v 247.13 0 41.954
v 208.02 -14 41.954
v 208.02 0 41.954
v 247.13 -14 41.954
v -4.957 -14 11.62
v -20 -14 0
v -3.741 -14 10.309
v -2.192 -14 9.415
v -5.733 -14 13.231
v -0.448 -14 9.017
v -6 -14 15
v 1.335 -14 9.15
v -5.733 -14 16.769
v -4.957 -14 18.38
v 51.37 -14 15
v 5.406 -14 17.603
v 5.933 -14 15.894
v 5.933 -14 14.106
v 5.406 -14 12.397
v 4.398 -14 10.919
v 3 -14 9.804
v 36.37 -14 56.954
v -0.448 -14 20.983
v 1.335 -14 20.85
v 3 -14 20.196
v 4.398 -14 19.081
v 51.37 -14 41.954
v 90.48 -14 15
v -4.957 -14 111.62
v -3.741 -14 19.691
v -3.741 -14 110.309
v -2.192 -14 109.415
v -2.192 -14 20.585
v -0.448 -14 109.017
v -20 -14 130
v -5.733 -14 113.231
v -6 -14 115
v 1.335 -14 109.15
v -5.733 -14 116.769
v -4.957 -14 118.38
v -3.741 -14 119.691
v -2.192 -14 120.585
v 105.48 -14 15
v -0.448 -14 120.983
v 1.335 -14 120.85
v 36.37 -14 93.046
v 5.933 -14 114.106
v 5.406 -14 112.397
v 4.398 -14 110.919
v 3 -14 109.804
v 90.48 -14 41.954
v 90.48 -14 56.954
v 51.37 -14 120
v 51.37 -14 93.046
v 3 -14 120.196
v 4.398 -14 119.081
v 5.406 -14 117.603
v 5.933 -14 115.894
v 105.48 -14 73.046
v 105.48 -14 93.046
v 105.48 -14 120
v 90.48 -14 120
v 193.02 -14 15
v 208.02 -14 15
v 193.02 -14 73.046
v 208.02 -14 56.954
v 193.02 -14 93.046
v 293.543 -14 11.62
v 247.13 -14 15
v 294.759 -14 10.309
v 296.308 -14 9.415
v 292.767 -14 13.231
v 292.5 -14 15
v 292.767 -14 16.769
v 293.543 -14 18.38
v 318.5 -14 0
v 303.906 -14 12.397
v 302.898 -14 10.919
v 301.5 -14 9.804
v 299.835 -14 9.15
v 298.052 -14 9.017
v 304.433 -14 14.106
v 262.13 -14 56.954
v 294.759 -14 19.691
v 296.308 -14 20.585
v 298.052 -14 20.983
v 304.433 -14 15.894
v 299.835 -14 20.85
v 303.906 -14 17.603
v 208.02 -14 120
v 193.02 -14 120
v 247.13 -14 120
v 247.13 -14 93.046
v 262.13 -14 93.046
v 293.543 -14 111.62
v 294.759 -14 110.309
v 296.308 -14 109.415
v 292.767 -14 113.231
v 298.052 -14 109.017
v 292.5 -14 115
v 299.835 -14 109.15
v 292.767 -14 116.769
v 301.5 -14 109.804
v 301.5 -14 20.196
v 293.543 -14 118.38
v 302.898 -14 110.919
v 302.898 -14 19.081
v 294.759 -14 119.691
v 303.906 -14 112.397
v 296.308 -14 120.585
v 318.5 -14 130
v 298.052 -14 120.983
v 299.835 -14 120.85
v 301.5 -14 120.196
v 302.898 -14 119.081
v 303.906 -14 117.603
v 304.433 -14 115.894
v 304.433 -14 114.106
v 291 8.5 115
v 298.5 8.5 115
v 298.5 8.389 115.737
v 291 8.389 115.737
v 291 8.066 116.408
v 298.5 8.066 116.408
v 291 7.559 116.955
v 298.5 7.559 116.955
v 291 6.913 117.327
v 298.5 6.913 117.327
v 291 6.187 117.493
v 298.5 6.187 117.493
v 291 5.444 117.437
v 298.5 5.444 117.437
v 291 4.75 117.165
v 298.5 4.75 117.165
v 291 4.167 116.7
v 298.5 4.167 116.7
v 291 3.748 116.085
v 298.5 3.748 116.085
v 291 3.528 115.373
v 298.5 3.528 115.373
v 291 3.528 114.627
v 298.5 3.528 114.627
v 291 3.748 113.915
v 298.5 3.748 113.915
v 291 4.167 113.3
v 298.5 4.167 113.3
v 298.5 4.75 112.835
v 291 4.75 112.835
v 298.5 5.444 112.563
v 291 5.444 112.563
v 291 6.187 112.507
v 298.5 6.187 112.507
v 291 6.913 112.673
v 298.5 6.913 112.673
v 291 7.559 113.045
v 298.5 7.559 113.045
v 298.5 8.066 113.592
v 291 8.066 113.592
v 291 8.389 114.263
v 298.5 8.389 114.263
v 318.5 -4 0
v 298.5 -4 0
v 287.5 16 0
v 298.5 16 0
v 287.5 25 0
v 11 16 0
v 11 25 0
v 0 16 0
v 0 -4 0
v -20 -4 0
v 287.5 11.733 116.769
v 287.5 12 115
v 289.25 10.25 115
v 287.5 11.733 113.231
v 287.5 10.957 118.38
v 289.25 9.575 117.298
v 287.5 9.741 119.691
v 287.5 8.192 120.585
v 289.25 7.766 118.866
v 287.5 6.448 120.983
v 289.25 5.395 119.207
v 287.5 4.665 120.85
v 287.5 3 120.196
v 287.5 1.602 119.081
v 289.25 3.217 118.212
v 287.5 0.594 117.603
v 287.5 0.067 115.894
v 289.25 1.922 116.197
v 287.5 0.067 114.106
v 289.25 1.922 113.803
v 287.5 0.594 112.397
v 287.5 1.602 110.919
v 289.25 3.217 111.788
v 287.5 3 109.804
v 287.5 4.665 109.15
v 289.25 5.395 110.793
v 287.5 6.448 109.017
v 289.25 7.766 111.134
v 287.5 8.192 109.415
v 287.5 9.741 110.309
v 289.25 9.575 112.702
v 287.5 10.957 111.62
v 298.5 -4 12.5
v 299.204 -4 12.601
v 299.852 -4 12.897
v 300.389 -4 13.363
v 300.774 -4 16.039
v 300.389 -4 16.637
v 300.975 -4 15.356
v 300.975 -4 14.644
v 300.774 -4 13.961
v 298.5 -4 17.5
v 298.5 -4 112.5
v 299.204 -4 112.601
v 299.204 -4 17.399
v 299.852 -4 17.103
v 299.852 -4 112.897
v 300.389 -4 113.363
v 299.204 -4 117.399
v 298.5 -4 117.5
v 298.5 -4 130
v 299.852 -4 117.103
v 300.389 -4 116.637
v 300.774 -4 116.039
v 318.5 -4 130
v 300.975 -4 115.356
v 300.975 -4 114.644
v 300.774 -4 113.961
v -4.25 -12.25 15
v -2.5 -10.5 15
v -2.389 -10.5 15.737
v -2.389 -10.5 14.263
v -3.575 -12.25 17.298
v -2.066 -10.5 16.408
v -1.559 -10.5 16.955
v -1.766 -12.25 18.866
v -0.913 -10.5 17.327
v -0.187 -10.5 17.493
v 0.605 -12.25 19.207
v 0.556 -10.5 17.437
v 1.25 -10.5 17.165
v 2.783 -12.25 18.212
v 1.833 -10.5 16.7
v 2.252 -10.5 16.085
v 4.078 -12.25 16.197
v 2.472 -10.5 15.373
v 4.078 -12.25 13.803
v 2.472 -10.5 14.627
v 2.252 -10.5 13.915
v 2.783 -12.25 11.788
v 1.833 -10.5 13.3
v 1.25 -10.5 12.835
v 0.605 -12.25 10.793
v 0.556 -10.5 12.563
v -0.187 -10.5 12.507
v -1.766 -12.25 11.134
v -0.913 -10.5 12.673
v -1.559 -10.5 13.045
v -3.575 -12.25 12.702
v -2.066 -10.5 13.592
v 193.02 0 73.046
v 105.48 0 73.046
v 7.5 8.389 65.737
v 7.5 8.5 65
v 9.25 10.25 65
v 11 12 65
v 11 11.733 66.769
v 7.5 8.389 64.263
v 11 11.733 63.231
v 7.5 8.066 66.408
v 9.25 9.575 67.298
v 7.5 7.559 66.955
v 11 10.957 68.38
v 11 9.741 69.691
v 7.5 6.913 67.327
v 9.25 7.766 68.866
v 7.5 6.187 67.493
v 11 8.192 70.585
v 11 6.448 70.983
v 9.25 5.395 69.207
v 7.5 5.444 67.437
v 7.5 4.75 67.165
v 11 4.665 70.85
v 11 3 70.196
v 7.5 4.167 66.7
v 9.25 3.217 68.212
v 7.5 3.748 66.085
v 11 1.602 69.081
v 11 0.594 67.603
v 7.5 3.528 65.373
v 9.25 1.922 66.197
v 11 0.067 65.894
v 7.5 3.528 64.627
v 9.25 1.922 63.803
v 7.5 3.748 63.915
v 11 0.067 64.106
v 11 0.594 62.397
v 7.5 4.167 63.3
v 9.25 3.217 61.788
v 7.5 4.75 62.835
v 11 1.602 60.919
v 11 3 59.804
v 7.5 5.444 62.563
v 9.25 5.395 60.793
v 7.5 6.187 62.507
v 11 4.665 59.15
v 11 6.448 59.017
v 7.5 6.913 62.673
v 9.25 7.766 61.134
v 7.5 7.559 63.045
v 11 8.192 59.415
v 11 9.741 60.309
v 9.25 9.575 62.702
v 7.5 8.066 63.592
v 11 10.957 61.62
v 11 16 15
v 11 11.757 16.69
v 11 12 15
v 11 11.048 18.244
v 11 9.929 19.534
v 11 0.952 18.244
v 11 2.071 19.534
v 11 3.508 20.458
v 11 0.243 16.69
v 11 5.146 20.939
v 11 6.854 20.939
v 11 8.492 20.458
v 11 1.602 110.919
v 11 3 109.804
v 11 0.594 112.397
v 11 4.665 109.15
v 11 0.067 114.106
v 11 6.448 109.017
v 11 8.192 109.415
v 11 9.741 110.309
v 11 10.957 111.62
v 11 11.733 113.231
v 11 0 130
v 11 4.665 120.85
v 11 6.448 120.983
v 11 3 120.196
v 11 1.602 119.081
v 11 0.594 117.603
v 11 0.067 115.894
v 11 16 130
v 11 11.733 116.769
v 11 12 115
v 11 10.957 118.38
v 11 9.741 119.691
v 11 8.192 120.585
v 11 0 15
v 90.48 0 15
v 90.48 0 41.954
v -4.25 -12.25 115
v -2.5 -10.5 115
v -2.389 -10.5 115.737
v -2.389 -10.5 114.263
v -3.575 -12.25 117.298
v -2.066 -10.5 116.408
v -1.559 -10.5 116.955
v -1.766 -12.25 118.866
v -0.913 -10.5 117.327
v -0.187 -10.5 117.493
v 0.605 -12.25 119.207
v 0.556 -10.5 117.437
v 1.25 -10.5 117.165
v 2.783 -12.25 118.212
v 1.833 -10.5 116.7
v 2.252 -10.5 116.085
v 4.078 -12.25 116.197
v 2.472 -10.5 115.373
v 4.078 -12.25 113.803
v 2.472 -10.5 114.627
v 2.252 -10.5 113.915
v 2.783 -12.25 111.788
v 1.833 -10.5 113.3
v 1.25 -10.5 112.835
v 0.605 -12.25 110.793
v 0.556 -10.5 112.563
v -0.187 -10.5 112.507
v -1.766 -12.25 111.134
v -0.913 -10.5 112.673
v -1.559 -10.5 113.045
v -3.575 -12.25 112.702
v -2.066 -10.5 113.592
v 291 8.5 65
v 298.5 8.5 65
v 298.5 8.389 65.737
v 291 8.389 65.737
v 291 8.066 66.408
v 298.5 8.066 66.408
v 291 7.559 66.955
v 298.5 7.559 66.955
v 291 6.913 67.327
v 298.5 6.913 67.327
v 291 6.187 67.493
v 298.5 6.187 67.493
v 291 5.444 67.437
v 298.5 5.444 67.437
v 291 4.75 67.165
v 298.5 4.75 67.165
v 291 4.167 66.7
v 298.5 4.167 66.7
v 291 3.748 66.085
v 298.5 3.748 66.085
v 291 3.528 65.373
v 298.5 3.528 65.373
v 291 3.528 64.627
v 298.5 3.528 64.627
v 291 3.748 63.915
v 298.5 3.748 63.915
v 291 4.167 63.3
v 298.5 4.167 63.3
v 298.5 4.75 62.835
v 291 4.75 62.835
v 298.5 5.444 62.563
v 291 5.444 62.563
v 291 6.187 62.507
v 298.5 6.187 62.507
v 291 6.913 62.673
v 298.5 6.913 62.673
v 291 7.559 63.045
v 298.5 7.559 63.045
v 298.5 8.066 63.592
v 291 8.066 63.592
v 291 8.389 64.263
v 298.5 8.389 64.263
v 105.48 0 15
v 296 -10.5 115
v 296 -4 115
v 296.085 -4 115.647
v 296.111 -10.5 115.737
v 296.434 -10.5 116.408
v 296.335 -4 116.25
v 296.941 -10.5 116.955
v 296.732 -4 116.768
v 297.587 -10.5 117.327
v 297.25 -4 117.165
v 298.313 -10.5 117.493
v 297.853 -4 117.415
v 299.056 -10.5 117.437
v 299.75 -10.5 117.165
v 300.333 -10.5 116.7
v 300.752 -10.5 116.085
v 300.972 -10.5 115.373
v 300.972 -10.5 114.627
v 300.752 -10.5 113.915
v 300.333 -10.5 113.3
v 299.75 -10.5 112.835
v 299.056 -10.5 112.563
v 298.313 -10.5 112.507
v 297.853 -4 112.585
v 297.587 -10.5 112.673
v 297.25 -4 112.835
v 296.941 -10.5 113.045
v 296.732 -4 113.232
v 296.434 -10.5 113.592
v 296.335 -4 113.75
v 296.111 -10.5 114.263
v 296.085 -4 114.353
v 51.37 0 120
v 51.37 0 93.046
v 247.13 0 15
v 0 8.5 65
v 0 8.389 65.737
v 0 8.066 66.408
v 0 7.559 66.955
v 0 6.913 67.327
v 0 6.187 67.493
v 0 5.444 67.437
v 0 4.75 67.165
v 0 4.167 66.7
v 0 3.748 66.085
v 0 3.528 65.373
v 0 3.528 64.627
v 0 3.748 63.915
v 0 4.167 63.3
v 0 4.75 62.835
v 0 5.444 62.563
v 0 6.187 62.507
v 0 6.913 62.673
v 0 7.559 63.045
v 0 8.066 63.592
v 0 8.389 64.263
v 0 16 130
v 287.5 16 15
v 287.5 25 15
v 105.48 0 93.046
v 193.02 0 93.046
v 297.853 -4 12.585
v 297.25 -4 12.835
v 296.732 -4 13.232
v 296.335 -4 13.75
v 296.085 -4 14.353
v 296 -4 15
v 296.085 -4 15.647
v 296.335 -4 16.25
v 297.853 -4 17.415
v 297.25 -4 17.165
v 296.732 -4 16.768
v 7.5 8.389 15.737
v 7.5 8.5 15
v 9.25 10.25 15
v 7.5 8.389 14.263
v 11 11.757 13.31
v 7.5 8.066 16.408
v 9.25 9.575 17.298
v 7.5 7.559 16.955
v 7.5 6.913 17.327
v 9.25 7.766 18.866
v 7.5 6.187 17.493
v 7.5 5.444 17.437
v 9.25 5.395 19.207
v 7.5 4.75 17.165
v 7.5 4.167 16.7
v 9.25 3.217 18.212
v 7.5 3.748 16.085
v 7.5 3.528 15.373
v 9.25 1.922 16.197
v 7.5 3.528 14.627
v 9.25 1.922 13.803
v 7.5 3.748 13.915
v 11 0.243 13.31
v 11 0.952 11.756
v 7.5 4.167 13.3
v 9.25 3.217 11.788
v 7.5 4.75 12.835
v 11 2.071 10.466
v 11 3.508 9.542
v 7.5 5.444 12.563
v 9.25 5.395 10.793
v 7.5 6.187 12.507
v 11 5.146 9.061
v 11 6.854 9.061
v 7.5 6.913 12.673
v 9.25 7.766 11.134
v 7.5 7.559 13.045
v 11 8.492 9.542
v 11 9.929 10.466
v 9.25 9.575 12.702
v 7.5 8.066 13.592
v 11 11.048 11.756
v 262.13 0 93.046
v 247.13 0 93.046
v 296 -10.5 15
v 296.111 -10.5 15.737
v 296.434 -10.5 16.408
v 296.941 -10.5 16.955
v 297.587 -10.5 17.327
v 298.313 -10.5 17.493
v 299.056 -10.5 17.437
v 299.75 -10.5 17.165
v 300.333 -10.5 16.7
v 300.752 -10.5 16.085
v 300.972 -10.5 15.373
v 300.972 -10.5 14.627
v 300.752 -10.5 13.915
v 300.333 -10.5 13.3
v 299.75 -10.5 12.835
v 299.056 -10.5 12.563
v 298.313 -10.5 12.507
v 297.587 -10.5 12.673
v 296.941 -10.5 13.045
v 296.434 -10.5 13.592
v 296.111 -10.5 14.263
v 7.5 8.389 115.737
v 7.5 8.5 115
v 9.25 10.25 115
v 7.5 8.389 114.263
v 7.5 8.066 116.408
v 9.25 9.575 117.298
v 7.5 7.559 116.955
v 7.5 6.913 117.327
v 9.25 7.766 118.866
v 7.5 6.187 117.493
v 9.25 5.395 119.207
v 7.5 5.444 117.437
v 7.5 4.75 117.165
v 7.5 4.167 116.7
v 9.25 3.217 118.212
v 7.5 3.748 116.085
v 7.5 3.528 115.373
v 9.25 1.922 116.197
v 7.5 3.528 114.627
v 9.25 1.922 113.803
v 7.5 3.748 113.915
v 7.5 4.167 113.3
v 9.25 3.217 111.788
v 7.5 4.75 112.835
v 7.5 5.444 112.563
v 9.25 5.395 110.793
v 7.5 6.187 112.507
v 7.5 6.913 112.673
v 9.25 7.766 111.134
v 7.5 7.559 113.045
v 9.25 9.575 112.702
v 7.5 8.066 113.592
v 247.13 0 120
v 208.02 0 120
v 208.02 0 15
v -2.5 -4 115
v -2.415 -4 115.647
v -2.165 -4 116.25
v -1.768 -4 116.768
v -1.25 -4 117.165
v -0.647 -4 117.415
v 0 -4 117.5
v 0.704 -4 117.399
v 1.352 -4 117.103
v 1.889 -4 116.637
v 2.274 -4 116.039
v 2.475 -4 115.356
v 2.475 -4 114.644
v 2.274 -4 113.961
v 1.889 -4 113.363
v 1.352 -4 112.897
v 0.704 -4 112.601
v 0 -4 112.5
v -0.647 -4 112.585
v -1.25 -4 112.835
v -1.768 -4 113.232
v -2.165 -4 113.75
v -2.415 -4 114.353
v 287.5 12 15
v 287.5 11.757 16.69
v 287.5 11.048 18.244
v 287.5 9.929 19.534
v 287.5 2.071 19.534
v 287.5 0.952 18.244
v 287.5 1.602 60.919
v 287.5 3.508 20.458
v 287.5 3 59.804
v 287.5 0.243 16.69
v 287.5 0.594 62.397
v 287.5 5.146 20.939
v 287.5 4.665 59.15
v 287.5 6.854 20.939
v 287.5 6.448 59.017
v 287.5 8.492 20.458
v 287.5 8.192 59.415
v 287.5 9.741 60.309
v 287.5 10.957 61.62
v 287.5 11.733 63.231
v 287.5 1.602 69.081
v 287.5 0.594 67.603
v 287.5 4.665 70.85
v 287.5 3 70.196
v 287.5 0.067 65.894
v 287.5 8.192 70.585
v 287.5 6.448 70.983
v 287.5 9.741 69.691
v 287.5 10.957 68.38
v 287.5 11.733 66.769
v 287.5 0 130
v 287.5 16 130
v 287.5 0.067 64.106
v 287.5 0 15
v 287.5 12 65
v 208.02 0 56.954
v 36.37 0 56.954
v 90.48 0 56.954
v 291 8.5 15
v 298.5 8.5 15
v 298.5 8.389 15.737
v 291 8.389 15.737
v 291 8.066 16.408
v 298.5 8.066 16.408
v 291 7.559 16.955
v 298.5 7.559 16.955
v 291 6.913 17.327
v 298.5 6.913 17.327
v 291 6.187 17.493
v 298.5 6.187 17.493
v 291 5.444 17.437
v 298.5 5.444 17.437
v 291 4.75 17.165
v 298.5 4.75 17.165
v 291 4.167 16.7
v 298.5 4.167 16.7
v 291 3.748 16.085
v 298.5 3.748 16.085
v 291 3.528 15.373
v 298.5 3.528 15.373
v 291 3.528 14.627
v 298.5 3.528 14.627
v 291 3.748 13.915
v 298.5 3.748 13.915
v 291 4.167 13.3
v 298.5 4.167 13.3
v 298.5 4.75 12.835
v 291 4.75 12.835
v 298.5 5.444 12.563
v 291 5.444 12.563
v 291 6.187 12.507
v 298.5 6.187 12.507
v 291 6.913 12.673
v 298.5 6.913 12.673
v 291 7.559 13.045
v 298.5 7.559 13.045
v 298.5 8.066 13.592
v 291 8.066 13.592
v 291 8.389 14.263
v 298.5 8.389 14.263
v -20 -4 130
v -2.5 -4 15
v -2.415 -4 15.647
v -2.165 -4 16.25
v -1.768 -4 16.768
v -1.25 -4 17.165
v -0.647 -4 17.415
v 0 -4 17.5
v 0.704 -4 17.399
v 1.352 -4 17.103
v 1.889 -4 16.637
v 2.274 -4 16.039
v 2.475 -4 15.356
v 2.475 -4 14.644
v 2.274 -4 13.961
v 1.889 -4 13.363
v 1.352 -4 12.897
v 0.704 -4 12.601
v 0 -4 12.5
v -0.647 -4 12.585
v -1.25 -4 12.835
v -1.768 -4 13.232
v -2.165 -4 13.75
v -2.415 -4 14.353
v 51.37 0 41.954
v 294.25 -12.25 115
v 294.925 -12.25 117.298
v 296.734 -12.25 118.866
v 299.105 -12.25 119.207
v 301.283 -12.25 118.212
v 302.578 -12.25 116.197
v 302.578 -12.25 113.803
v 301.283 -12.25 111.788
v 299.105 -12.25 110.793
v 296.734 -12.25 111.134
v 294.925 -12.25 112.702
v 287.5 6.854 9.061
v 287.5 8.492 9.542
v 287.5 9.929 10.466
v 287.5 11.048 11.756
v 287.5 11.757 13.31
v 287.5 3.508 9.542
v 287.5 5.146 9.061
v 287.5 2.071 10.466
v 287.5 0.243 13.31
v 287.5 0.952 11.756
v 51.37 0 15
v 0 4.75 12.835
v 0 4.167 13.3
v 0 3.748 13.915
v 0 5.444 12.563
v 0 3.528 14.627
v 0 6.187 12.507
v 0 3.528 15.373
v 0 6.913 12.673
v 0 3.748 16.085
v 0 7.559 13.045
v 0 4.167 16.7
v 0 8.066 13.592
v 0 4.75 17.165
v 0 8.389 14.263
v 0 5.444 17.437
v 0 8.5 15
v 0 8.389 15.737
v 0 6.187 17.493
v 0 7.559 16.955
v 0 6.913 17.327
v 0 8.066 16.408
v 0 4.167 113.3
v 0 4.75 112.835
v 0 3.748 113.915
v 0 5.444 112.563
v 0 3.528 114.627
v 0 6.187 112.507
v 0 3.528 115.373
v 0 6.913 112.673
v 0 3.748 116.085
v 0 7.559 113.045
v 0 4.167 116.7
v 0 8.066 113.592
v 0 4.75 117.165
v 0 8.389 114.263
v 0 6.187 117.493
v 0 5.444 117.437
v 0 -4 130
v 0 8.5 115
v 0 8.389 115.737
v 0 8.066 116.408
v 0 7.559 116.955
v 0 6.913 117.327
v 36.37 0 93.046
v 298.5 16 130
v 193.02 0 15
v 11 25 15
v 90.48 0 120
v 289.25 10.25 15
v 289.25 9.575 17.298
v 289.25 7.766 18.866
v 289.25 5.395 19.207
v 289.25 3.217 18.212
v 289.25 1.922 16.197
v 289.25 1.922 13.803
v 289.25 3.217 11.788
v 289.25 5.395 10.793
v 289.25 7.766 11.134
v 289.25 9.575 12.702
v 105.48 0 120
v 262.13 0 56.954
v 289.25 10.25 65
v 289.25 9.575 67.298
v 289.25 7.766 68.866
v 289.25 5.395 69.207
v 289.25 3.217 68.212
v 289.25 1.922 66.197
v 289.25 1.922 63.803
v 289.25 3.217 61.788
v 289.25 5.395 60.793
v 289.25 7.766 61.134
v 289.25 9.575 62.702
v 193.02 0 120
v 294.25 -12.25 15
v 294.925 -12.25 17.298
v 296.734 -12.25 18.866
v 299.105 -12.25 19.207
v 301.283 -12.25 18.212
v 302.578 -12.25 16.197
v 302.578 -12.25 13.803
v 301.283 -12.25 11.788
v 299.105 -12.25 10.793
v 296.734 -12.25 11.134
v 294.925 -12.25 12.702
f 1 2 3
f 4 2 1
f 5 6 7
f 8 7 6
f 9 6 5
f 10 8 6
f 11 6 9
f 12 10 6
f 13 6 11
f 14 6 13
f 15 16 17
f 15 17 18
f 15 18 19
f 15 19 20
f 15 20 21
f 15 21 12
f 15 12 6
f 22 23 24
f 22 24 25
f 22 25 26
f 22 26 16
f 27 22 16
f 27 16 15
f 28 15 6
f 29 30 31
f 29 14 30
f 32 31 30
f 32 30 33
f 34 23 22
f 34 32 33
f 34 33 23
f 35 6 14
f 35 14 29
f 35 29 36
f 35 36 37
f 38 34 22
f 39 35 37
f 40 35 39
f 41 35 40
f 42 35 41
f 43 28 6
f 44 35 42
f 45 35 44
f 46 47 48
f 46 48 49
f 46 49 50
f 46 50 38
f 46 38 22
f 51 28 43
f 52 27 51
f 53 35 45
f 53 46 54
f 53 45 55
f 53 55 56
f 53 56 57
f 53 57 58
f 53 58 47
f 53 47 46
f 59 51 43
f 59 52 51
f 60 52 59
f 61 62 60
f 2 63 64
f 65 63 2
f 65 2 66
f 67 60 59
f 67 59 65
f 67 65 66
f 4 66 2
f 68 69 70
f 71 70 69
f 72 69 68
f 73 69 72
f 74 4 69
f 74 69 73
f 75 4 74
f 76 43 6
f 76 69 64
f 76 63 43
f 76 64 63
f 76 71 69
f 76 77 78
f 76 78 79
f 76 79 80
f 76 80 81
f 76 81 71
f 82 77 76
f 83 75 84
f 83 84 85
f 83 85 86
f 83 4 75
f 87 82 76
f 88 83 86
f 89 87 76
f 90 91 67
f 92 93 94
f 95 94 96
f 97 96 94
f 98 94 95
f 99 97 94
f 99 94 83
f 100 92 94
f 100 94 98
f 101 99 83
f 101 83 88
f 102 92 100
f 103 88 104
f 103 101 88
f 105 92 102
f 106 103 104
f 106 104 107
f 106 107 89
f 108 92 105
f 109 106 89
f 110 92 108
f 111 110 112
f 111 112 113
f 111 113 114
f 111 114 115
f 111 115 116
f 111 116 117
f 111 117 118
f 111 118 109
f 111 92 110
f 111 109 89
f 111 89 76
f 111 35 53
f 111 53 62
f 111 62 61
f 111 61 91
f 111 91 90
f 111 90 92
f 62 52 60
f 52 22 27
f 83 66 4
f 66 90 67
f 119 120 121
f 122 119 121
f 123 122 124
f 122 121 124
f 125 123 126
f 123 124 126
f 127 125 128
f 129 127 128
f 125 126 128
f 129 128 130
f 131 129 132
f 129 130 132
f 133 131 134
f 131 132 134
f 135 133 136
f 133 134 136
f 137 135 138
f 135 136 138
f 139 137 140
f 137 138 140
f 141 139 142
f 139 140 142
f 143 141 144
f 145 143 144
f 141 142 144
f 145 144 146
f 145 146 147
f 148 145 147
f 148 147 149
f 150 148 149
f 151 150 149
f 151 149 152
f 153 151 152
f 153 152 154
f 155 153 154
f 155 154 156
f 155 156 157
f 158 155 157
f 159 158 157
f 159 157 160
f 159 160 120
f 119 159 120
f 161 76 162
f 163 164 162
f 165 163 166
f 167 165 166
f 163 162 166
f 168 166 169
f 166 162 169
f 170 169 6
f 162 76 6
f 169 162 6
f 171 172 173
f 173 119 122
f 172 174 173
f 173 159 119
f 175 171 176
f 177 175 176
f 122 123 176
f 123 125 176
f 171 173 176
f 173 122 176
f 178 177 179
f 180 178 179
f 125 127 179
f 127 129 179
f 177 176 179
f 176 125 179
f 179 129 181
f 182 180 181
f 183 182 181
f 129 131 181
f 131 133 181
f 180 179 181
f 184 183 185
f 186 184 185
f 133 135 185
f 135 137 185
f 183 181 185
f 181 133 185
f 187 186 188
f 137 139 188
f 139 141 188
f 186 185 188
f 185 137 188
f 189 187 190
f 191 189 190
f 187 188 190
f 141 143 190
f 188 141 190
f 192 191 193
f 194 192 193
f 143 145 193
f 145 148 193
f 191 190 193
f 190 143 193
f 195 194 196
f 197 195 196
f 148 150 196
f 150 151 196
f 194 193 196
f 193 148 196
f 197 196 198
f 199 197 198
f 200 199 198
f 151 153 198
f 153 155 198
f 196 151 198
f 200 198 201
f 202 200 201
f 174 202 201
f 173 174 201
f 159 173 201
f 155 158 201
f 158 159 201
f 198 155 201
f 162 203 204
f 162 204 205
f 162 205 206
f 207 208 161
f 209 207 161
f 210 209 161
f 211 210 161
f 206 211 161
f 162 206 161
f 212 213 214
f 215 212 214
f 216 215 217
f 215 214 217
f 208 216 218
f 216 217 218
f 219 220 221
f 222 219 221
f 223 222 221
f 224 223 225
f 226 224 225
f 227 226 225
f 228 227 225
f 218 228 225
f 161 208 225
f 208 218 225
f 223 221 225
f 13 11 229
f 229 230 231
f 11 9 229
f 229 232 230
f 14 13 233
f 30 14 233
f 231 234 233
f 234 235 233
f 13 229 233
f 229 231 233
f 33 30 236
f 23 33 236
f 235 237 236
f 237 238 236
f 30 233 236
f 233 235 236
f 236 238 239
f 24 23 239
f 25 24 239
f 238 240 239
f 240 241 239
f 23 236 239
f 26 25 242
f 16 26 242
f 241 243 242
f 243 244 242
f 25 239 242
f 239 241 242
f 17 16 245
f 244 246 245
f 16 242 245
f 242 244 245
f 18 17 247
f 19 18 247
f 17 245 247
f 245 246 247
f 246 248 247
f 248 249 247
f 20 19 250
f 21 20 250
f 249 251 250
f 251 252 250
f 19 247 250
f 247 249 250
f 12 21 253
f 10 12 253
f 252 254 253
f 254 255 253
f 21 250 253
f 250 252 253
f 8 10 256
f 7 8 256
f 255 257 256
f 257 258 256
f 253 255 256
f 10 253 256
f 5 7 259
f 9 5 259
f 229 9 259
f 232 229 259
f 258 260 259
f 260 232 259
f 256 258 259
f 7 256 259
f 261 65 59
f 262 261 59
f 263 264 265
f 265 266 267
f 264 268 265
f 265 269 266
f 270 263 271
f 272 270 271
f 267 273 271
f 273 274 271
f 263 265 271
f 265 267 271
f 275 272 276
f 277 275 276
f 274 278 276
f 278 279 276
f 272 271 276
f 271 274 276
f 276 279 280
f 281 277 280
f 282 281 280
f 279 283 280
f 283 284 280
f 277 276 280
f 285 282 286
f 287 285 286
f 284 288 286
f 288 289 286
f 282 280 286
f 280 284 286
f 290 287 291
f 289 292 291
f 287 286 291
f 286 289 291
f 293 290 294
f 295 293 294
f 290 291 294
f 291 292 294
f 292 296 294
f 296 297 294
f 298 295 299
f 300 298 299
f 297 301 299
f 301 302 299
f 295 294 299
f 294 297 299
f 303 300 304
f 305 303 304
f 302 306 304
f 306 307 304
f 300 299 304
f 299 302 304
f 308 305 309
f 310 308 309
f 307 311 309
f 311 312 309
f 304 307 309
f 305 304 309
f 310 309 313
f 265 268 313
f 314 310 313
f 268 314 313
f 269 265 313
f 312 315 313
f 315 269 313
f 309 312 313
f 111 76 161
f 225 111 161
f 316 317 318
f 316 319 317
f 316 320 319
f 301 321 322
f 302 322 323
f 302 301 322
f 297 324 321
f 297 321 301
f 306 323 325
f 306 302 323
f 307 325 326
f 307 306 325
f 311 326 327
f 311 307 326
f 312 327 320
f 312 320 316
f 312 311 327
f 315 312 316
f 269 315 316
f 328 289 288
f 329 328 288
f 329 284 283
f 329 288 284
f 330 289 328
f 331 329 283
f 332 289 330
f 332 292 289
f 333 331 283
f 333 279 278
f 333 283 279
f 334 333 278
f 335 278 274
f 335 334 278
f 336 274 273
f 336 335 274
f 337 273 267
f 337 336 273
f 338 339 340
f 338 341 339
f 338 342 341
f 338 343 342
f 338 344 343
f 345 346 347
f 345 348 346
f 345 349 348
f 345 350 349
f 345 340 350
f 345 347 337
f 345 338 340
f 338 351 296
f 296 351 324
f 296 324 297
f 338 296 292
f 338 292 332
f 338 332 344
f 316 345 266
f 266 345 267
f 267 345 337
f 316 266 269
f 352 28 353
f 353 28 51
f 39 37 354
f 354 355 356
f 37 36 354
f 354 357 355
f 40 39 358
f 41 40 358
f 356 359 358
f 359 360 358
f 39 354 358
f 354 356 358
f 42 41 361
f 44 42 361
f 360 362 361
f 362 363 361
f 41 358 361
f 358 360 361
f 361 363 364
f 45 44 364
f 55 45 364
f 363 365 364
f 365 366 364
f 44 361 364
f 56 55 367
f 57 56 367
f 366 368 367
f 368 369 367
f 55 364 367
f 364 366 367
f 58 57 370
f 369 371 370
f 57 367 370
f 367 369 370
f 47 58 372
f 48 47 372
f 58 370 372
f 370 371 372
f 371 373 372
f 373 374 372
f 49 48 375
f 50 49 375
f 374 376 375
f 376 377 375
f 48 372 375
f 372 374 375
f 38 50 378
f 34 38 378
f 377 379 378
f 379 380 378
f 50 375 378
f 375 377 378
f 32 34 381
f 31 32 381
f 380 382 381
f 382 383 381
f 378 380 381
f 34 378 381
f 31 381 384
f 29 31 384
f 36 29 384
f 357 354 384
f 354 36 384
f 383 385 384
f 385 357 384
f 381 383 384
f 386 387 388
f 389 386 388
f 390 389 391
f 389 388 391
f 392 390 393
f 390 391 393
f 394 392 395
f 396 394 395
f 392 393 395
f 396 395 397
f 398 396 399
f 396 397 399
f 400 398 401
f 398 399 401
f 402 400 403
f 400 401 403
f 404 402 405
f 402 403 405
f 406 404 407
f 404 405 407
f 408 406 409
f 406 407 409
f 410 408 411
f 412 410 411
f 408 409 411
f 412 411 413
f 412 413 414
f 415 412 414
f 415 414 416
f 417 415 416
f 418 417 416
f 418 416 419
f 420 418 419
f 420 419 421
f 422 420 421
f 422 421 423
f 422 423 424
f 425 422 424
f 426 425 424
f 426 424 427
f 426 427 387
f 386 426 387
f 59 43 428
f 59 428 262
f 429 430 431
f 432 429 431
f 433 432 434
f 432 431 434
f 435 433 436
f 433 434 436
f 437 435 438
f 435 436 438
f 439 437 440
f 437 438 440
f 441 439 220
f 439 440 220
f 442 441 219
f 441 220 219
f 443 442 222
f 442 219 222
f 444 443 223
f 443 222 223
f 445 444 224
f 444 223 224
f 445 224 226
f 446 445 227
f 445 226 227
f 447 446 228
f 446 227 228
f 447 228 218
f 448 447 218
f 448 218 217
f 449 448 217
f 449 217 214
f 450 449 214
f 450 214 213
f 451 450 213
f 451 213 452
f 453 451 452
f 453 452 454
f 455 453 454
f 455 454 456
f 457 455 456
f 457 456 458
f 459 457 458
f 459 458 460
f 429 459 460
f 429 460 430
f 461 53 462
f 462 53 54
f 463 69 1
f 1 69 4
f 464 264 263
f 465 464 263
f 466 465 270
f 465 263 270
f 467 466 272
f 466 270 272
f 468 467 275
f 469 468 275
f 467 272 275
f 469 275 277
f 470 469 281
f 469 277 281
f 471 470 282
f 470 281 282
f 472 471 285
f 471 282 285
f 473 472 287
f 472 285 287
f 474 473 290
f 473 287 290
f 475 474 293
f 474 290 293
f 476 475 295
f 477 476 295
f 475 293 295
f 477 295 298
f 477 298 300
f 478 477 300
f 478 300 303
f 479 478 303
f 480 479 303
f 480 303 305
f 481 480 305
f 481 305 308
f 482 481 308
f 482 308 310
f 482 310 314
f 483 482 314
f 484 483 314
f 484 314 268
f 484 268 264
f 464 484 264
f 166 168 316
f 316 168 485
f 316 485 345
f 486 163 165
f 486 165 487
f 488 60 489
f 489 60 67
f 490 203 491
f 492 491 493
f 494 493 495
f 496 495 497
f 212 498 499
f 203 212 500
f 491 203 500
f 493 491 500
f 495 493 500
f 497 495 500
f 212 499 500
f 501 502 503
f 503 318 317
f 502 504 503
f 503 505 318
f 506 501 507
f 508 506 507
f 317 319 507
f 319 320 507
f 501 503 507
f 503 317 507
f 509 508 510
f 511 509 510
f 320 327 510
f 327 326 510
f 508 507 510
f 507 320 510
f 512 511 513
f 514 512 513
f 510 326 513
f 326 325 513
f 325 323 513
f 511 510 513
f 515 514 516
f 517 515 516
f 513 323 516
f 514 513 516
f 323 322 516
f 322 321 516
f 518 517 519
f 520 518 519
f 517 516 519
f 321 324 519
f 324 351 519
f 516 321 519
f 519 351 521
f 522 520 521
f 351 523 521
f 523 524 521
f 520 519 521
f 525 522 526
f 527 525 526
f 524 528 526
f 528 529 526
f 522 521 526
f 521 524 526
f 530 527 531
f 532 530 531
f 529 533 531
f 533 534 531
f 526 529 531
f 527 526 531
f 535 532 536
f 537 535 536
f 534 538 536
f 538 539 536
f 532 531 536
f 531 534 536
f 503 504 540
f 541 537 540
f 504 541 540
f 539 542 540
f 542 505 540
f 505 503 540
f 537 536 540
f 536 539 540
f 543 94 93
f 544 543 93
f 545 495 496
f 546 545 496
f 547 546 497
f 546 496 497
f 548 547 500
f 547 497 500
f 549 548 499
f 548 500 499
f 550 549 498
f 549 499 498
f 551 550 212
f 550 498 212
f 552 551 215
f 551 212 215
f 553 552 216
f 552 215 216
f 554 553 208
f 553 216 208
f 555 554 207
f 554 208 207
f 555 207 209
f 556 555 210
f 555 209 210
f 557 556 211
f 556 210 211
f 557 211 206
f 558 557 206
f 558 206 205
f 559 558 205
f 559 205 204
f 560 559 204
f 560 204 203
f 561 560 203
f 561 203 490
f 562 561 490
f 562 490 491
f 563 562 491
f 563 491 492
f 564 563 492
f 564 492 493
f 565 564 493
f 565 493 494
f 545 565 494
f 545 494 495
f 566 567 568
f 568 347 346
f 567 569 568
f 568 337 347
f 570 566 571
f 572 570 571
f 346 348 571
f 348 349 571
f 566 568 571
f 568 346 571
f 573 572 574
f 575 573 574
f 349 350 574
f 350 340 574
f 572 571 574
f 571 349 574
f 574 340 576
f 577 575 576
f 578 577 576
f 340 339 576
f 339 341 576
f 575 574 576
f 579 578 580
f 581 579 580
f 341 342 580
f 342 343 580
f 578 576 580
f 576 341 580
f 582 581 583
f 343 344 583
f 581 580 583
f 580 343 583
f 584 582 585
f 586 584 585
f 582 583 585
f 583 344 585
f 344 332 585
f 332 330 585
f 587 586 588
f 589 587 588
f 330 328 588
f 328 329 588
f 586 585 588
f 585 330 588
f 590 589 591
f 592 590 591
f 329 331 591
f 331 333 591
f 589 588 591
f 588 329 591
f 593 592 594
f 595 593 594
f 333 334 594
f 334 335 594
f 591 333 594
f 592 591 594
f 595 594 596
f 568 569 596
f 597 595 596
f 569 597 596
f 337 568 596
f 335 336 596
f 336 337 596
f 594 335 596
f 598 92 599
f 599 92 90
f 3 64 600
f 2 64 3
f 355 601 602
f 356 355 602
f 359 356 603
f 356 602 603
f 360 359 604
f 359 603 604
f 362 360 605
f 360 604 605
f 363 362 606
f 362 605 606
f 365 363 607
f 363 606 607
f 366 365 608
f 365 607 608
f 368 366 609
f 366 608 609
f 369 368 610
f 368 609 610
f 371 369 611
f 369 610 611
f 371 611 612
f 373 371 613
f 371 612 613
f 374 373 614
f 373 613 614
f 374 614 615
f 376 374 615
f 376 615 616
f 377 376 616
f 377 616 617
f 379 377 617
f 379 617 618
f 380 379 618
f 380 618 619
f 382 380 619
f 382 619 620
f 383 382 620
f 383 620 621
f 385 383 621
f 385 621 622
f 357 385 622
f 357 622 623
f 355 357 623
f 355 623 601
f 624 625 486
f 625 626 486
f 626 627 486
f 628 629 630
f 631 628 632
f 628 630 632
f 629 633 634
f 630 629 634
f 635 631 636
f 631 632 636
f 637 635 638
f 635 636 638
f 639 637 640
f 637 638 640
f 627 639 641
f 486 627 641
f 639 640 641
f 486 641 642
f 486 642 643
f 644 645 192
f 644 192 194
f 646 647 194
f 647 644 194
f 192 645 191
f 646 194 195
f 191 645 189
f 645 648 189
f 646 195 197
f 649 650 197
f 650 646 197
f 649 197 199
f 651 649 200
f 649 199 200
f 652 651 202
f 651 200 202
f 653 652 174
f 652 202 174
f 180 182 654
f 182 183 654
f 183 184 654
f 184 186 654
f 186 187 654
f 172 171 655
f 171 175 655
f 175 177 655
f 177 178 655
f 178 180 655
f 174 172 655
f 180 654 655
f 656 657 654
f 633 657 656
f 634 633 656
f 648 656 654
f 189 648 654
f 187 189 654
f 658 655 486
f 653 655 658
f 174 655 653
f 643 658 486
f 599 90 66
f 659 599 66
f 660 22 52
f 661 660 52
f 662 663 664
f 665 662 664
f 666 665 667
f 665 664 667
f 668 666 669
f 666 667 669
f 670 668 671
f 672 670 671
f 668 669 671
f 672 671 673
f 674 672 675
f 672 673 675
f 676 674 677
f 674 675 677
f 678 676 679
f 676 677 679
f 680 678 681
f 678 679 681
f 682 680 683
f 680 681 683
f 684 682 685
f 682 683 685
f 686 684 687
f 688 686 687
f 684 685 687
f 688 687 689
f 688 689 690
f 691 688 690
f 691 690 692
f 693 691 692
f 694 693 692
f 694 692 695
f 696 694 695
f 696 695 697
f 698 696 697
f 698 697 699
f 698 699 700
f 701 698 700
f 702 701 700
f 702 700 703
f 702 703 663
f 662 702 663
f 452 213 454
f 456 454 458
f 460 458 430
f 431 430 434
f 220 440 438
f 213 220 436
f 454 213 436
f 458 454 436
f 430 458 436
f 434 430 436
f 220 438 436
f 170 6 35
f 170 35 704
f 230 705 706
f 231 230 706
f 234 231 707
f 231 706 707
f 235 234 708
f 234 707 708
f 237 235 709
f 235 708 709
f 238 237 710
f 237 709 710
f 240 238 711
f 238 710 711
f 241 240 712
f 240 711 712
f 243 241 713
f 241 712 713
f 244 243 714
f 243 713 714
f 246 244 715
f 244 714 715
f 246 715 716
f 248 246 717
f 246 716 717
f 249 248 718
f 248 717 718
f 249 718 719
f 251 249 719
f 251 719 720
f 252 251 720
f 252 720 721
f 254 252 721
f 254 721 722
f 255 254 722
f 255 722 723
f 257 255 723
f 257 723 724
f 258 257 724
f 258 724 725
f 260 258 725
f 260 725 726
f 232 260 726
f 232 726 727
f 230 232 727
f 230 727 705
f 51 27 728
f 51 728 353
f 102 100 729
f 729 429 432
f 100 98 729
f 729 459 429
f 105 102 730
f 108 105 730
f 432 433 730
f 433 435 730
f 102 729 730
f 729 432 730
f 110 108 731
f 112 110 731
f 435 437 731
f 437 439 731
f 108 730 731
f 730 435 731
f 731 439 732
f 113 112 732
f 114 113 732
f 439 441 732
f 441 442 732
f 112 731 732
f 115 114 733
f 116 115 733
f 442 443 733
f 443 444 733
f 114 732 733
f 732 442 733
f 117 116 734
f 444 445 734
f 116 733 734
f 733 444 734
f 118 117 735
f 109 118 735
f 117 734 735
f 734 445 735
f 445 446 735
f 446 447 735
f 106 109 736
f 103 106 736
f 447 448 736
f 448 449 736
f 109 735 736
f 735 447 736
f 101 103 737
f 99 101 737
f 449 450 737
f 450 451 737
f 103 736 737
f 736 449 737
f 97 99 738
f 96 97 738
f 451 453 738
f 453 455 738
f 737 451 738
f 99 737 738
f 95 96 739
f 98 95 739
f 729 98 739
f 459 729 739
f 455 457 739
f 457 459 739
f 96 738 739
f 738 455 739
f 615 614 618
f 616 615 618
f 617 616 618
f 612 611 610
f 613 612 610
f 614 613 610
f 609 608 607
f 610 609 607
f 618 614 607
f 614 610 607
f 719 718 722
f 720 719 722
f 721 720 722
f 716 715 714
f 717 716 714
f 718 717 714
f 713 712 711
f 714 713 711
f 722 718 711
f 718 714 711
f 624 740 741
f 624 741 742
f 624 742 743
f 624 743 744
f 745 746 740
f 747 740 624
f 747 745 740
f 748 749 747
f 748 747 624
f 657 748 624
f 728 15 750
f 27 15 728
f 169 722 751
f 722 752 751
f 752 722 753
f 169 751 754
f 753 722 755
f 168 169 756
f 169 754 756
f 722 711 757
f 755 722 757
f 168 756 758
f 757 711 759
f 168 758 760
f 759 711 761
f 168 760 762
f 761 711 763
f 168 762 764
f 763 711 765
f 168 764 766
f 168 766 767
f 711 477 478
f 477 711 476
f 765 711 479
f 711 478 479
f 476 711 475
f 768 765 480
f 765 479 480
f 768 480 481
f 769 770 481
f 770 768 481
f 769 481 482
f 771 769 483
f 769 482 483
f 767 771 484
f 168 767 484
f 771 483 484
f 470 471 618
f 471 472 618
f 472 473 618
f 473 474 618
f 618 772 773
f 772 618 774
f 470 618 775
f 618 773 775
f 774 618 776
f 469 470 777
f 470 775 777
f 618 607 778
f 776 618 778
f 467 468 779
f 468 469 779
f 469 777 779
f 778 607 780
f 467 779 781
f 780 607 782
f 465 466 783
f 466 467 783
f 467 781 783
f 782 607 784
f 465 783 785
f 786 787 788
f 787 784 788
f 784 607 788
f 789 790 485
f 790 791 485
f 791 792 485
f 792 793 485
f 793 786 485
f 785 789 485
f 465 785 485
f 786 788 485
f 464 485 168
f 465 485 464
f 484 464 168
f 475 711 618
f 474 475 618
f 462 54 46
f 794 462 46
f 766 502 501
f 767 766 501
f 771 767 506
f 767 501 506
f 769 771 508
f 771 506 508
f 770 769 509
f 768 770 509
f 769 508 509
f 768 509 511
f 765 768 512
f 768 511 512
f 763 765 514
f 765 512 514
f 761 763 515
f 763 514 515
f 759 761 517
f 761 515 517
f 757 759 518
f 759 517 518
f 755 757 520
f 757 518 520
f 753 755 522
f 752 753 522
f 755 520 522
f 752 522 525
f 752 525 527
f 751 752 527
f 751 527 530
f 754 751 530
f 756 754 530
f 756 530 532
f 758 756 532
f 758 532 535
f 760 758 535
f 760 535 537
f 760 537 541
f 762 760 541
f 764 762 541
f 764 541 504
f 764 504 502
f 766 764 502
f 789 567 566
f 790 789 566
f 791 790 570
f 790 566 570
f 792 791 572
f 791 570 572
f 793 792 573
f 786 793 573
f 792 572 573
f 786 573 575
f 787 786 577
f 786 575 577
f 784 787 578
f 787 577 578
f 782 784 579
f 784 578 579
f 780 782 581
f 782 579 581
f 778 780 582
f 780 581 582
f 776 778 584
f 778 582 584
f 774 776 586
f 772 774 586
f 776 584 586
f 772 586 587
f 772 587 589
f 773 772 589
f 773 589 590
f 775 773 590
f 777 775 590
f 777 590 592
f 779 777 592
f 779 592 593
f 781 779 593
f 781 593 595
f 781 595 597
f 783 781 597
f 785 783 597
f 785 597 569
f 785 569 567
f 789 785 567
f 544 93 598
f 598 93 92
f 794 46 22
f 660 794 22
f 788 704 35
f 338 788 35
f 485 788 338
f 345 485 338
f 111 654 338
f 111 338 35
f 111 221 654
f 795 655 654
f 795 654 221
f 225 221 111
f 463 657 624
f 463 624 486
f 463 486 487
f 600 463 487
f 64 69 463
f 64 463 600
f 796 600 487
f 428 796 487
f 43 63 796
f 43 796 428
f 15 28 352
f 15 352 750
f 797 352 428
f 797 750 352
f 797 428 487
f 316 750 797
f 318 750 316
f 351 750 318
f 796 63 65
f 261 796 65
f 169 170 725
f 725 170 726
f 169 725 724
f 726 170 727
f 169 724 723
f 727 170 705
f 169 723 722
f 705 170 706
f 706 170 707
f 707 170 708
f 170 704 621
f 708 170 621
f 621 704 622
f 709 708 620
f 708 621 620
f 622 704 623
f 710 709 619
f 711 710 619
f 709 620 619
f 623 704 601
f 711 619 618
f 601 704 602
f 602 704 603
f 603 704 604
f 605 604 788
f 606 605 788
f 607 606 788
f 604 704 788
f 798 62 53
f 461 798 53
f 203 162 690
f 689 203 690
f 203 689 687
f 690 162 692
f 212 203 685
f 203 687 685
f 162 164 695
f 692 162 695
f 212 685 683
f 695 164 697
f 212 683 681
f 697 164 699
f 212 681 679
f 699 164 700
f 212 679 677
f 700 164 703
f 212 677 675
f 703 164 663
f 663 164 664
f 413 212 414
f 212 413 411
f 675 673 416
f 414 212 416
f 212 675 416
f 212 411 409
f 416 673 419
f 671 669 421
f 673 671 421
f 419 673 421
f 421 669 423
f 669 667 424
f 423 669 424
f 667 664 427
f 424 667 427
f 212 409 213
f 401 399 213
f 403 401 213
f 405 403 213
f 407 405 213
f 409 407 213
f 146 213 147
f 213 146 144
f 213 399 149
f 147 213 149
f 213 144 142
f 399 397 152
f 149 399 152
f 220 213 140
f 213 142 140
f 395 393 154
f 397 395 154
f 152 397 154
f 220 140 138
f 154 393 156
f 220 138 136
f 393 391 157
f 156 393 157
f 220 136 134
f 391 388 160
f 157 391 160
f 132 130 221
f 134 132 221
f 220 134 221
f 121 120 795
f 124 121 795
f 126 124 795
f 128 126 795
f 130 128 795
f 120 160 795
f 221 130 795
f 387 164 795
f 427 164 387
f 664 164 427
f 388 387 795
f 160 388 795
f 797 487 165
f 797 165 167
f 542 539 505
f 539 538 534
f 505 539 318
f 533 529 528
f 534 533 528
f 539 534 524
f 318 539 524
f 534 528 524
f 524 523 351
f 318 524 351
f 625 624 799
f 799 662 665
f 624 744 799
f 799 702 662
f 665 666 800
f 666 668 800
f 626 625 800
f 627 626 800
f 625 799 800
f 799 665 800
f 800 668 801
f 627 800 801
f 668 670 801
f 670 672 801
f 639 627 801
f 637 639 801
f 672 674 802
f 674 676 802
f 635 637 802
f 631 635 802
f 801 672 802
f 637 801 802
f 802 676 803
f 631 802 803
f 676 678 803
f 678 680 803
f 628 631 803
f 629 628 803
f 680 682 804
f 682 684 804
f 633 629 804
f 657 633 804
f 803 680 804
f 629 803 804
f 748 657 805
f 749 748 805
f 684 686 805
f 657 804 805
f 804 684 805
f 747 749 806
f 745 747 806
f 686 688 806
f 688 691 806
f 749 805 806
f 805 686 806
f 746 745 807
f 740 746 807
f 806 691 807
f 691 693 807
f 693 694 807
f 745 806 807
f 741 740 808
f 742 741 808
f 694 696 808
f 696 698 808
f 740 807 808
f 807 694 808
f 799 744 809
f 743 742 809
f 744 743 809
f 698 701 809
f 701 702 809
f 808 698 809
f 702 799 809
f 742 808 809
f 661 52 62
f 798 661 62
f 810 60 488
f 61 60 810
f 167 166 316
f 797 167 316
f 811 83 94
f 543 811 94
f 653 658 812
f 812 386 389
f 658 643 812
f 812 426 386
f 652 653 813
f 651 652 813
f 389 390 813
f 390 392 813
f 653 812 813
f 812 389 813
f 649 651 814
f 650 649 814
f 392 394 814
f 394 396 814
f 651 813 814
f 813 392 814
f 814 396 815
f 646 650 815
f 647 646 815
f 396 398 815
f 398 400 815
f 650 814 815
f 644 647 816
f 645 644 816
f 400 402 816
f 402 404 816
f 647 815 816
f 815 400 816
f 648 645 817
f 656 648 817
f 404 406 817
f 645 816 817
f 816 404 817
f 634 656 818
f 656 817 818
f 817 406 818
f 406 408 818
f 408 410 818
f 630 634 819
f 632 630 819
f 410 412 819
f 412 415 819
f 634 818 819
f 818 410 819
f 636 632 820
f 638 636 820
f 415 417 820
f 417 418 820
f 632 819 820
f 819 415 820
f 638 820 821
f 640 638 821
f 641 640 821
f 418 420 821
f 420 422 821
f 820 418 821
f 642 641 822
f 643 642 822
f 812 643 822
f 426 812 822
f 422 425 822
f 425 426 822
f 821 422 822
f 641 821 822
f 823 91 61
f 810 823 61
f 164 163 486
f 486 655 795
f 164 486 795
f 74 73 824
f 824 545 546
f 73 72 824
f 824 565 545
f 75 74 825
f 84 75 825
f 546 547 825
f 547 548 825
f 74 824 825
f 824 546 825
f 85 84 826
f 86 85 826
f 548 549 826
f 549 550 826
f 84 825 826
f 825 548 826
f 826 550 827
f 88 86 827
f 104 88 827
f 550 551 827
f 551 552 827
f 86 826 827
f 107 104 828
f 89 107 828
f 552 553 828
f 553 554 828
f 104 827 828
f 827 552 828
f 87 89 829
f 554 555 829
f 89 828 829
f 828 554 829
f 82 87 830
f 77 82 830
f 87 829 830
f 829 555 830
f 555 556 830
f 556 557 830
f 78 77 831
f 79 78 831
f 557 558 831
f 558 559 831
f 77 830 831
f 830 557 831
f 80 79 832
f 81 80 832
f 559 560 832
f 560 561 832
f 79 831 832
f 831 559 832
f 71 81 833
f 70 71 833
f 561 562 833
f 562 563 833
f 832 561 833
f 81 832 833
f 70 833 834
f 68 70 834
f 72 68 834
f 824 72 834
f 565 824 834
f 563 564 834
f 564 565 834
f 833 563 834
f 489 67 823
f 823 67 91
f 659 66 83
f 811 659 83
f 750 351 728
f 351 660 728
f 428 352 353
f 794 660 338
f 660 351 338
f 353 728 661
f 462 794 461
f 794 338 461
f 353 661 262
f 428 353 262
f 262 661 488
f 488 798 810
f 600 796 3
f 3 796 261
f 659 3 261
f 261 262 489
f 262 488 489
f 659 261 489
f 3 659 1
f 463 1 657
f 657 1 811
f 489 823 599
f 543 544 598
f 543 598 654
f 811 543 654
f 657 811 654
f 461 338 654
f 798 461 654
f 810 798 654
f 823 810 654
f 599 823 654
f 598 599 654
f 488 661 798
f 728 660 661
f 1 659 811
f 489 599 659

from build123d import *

# Parameters (mm, degrees)
F0_W      = 298.5
F0_H      = 130
F1_DEPTH  = 14
F2_W      = 20
F2_H      = 10
F3_DEPTH  = 130
F4_W      = 11
F4_H      = 16
F5_DEPTH  = 130
F6_W      = 39.1095238095
F6_H      = 26.9544340008
F6_W_2    = 43.7704761905
F6_H_2    = 58.0455659992
F7_DEPTH  = 25
F8_R      = 2.5
F9_DEPTH  = 25
F10_R     = 2.5
F11_DEPTH = 318.501
F12_SIZE  = 3.49999
F14_W     = 276.5
F14_H     = 15
F13_DEPTH = 25


# Not quite as in the source:
# - a fillet or chamfer is up to 0.001 mm smaller than in the source, because OpenCascade refuses the exact size
# - a feature names something its author has since deleted; it is built from what else it names


with BuildPart() as f1:
    # F0 (on Front) → F1 (new body)
    with BuildSketch(Plane.XZ):
        with Locations((149.25, 65)):
            Rectangle(F0_W, F0_H)
    extrude(amount=F1_DEPTH)

    # F2 (on face) → F3 (join, through all)
    with BuildSketch(Plane.XY.offset(130)):
        with Locations((308.5, -9)):
            Rectangle(F2_W, F2_H)
        with Locations((-10, -9)):
            Rectangle(F2_W, F2_H)
    extrude(amount=-F3_DEPTH)

    # F4 (on face) → F5 (join, through all)
    with BuildSketch(Plane.XY.offset(130)):
        with Locations((5.5, 8)):
            Rectangle(F4_W, F4_H)
        with Locations((293, 8)):
            Rectangle(F4_W, F4_H)
    extrude(amount=-F5_DEPTH)

    # F6 (on face) → F7 (cut)
    with BuildSketch(Plane.XZ.offset(14)):
        Polygon((51.37, 120), (51.37, 93.0455659992), (36.37, 93.0455659992), (36.3699999999, 56.9544340008), (90.4795238095, 56.9544340008), (90.4795238095, 120), align=None)
        with Locations((70.9247619048, 28.4772170004)):
            Rectangle(F6_W, F6_H)
        with Locations((127.3647619048, 44.0227829996)):
            Rectangle(F6_W_2, F6_H_2)
        with Locations((171.1352380952, 44.0227829996)):
            Rectangle(F6_W_2, F6_H_2)
        with Locations((127.3647619048, 106.5227829996)):
            Rectangle(F6_W_2, F6_H)
        with Locations((171.1352380952, 106.5227829996)):
            Rectangle(F6_W_2, F6_H)
        Polygon((247.1300000001, 120), (208.0204761905, 120), (208.0204761905, 56.9544340008), (262.13, 56.9544340008), (262.13, 93.0455659992), (247.13, 93.0455659992), align=None)
        with Locations((227.5752380952, 28.4772170004)):
            Rectangle(F6_W, F6_H)
    extrude(amount=-F7_DEPTH, mode=Mode.SUBTRACT)

    # F8 (on face) → F9 (cut)
    with BuildSketch(Plane(origin=(0, -4, 0), x_dir=(-1, 0, 0), z_dir=(0, 1, 0))):
        with Locations((-298.5, 115)):
            Circle(F8_R)
        with Locations((-298.5, 15)):
            Circle(F8_R)
        with Locations((0, 115)):
            Circle(F8_R)
        with Locations((0, 15)):
            Circle(F8_R)
    extrude(amount=-F9_DEPTH, mode=Mode.SUBTRACT)

    # F10 (on face) → F11 (cut, through all)
    with BuildSketch(Plane.YZ.offset(298.5)):
        with Locations((6, 115)):
            Circle(F10_R)
        with Locations((6, 15)):
            Circle(F10_R)
        with Locations((6, 65)):
            Circle(F10_R)
    extrude(amount=-F11_DEPTH, mode=Mode.SUBTRACT)

    # F12 (size 3.5 in the source; OpenCascade refuses exactly that, so slightly less here)
    f12_edges = [f1.edges().sort_by_distance(p)[0] for p in [
        (301, -14, 115),
        (301, -14, 15),
        (2.5, -14, 115),
        (2.5, -14, 15),
        (287.5, 3.5, 115),
        (287.5, 3.5, 65),
        (287.5, 3.5, 15),
        (11, 3.5, 115),
        (11, 3.5, 65),
        (11, 3.5, 15),
    ]]
    chamfer(f12_edges, length=F12_SIZE)

    # F14 (on face) → F13 (join)
    with BuildSketch(Plane(origin=(0, 0, 0), x_dir=(-1, 0, 0), z_dir=(0, 1, 0))):
        with Locations((-149.25, 7.5)):
            Rectangle(F14_W, F14_H)
    extrude(amount=F13_DEPTH)


solid = f1.part
